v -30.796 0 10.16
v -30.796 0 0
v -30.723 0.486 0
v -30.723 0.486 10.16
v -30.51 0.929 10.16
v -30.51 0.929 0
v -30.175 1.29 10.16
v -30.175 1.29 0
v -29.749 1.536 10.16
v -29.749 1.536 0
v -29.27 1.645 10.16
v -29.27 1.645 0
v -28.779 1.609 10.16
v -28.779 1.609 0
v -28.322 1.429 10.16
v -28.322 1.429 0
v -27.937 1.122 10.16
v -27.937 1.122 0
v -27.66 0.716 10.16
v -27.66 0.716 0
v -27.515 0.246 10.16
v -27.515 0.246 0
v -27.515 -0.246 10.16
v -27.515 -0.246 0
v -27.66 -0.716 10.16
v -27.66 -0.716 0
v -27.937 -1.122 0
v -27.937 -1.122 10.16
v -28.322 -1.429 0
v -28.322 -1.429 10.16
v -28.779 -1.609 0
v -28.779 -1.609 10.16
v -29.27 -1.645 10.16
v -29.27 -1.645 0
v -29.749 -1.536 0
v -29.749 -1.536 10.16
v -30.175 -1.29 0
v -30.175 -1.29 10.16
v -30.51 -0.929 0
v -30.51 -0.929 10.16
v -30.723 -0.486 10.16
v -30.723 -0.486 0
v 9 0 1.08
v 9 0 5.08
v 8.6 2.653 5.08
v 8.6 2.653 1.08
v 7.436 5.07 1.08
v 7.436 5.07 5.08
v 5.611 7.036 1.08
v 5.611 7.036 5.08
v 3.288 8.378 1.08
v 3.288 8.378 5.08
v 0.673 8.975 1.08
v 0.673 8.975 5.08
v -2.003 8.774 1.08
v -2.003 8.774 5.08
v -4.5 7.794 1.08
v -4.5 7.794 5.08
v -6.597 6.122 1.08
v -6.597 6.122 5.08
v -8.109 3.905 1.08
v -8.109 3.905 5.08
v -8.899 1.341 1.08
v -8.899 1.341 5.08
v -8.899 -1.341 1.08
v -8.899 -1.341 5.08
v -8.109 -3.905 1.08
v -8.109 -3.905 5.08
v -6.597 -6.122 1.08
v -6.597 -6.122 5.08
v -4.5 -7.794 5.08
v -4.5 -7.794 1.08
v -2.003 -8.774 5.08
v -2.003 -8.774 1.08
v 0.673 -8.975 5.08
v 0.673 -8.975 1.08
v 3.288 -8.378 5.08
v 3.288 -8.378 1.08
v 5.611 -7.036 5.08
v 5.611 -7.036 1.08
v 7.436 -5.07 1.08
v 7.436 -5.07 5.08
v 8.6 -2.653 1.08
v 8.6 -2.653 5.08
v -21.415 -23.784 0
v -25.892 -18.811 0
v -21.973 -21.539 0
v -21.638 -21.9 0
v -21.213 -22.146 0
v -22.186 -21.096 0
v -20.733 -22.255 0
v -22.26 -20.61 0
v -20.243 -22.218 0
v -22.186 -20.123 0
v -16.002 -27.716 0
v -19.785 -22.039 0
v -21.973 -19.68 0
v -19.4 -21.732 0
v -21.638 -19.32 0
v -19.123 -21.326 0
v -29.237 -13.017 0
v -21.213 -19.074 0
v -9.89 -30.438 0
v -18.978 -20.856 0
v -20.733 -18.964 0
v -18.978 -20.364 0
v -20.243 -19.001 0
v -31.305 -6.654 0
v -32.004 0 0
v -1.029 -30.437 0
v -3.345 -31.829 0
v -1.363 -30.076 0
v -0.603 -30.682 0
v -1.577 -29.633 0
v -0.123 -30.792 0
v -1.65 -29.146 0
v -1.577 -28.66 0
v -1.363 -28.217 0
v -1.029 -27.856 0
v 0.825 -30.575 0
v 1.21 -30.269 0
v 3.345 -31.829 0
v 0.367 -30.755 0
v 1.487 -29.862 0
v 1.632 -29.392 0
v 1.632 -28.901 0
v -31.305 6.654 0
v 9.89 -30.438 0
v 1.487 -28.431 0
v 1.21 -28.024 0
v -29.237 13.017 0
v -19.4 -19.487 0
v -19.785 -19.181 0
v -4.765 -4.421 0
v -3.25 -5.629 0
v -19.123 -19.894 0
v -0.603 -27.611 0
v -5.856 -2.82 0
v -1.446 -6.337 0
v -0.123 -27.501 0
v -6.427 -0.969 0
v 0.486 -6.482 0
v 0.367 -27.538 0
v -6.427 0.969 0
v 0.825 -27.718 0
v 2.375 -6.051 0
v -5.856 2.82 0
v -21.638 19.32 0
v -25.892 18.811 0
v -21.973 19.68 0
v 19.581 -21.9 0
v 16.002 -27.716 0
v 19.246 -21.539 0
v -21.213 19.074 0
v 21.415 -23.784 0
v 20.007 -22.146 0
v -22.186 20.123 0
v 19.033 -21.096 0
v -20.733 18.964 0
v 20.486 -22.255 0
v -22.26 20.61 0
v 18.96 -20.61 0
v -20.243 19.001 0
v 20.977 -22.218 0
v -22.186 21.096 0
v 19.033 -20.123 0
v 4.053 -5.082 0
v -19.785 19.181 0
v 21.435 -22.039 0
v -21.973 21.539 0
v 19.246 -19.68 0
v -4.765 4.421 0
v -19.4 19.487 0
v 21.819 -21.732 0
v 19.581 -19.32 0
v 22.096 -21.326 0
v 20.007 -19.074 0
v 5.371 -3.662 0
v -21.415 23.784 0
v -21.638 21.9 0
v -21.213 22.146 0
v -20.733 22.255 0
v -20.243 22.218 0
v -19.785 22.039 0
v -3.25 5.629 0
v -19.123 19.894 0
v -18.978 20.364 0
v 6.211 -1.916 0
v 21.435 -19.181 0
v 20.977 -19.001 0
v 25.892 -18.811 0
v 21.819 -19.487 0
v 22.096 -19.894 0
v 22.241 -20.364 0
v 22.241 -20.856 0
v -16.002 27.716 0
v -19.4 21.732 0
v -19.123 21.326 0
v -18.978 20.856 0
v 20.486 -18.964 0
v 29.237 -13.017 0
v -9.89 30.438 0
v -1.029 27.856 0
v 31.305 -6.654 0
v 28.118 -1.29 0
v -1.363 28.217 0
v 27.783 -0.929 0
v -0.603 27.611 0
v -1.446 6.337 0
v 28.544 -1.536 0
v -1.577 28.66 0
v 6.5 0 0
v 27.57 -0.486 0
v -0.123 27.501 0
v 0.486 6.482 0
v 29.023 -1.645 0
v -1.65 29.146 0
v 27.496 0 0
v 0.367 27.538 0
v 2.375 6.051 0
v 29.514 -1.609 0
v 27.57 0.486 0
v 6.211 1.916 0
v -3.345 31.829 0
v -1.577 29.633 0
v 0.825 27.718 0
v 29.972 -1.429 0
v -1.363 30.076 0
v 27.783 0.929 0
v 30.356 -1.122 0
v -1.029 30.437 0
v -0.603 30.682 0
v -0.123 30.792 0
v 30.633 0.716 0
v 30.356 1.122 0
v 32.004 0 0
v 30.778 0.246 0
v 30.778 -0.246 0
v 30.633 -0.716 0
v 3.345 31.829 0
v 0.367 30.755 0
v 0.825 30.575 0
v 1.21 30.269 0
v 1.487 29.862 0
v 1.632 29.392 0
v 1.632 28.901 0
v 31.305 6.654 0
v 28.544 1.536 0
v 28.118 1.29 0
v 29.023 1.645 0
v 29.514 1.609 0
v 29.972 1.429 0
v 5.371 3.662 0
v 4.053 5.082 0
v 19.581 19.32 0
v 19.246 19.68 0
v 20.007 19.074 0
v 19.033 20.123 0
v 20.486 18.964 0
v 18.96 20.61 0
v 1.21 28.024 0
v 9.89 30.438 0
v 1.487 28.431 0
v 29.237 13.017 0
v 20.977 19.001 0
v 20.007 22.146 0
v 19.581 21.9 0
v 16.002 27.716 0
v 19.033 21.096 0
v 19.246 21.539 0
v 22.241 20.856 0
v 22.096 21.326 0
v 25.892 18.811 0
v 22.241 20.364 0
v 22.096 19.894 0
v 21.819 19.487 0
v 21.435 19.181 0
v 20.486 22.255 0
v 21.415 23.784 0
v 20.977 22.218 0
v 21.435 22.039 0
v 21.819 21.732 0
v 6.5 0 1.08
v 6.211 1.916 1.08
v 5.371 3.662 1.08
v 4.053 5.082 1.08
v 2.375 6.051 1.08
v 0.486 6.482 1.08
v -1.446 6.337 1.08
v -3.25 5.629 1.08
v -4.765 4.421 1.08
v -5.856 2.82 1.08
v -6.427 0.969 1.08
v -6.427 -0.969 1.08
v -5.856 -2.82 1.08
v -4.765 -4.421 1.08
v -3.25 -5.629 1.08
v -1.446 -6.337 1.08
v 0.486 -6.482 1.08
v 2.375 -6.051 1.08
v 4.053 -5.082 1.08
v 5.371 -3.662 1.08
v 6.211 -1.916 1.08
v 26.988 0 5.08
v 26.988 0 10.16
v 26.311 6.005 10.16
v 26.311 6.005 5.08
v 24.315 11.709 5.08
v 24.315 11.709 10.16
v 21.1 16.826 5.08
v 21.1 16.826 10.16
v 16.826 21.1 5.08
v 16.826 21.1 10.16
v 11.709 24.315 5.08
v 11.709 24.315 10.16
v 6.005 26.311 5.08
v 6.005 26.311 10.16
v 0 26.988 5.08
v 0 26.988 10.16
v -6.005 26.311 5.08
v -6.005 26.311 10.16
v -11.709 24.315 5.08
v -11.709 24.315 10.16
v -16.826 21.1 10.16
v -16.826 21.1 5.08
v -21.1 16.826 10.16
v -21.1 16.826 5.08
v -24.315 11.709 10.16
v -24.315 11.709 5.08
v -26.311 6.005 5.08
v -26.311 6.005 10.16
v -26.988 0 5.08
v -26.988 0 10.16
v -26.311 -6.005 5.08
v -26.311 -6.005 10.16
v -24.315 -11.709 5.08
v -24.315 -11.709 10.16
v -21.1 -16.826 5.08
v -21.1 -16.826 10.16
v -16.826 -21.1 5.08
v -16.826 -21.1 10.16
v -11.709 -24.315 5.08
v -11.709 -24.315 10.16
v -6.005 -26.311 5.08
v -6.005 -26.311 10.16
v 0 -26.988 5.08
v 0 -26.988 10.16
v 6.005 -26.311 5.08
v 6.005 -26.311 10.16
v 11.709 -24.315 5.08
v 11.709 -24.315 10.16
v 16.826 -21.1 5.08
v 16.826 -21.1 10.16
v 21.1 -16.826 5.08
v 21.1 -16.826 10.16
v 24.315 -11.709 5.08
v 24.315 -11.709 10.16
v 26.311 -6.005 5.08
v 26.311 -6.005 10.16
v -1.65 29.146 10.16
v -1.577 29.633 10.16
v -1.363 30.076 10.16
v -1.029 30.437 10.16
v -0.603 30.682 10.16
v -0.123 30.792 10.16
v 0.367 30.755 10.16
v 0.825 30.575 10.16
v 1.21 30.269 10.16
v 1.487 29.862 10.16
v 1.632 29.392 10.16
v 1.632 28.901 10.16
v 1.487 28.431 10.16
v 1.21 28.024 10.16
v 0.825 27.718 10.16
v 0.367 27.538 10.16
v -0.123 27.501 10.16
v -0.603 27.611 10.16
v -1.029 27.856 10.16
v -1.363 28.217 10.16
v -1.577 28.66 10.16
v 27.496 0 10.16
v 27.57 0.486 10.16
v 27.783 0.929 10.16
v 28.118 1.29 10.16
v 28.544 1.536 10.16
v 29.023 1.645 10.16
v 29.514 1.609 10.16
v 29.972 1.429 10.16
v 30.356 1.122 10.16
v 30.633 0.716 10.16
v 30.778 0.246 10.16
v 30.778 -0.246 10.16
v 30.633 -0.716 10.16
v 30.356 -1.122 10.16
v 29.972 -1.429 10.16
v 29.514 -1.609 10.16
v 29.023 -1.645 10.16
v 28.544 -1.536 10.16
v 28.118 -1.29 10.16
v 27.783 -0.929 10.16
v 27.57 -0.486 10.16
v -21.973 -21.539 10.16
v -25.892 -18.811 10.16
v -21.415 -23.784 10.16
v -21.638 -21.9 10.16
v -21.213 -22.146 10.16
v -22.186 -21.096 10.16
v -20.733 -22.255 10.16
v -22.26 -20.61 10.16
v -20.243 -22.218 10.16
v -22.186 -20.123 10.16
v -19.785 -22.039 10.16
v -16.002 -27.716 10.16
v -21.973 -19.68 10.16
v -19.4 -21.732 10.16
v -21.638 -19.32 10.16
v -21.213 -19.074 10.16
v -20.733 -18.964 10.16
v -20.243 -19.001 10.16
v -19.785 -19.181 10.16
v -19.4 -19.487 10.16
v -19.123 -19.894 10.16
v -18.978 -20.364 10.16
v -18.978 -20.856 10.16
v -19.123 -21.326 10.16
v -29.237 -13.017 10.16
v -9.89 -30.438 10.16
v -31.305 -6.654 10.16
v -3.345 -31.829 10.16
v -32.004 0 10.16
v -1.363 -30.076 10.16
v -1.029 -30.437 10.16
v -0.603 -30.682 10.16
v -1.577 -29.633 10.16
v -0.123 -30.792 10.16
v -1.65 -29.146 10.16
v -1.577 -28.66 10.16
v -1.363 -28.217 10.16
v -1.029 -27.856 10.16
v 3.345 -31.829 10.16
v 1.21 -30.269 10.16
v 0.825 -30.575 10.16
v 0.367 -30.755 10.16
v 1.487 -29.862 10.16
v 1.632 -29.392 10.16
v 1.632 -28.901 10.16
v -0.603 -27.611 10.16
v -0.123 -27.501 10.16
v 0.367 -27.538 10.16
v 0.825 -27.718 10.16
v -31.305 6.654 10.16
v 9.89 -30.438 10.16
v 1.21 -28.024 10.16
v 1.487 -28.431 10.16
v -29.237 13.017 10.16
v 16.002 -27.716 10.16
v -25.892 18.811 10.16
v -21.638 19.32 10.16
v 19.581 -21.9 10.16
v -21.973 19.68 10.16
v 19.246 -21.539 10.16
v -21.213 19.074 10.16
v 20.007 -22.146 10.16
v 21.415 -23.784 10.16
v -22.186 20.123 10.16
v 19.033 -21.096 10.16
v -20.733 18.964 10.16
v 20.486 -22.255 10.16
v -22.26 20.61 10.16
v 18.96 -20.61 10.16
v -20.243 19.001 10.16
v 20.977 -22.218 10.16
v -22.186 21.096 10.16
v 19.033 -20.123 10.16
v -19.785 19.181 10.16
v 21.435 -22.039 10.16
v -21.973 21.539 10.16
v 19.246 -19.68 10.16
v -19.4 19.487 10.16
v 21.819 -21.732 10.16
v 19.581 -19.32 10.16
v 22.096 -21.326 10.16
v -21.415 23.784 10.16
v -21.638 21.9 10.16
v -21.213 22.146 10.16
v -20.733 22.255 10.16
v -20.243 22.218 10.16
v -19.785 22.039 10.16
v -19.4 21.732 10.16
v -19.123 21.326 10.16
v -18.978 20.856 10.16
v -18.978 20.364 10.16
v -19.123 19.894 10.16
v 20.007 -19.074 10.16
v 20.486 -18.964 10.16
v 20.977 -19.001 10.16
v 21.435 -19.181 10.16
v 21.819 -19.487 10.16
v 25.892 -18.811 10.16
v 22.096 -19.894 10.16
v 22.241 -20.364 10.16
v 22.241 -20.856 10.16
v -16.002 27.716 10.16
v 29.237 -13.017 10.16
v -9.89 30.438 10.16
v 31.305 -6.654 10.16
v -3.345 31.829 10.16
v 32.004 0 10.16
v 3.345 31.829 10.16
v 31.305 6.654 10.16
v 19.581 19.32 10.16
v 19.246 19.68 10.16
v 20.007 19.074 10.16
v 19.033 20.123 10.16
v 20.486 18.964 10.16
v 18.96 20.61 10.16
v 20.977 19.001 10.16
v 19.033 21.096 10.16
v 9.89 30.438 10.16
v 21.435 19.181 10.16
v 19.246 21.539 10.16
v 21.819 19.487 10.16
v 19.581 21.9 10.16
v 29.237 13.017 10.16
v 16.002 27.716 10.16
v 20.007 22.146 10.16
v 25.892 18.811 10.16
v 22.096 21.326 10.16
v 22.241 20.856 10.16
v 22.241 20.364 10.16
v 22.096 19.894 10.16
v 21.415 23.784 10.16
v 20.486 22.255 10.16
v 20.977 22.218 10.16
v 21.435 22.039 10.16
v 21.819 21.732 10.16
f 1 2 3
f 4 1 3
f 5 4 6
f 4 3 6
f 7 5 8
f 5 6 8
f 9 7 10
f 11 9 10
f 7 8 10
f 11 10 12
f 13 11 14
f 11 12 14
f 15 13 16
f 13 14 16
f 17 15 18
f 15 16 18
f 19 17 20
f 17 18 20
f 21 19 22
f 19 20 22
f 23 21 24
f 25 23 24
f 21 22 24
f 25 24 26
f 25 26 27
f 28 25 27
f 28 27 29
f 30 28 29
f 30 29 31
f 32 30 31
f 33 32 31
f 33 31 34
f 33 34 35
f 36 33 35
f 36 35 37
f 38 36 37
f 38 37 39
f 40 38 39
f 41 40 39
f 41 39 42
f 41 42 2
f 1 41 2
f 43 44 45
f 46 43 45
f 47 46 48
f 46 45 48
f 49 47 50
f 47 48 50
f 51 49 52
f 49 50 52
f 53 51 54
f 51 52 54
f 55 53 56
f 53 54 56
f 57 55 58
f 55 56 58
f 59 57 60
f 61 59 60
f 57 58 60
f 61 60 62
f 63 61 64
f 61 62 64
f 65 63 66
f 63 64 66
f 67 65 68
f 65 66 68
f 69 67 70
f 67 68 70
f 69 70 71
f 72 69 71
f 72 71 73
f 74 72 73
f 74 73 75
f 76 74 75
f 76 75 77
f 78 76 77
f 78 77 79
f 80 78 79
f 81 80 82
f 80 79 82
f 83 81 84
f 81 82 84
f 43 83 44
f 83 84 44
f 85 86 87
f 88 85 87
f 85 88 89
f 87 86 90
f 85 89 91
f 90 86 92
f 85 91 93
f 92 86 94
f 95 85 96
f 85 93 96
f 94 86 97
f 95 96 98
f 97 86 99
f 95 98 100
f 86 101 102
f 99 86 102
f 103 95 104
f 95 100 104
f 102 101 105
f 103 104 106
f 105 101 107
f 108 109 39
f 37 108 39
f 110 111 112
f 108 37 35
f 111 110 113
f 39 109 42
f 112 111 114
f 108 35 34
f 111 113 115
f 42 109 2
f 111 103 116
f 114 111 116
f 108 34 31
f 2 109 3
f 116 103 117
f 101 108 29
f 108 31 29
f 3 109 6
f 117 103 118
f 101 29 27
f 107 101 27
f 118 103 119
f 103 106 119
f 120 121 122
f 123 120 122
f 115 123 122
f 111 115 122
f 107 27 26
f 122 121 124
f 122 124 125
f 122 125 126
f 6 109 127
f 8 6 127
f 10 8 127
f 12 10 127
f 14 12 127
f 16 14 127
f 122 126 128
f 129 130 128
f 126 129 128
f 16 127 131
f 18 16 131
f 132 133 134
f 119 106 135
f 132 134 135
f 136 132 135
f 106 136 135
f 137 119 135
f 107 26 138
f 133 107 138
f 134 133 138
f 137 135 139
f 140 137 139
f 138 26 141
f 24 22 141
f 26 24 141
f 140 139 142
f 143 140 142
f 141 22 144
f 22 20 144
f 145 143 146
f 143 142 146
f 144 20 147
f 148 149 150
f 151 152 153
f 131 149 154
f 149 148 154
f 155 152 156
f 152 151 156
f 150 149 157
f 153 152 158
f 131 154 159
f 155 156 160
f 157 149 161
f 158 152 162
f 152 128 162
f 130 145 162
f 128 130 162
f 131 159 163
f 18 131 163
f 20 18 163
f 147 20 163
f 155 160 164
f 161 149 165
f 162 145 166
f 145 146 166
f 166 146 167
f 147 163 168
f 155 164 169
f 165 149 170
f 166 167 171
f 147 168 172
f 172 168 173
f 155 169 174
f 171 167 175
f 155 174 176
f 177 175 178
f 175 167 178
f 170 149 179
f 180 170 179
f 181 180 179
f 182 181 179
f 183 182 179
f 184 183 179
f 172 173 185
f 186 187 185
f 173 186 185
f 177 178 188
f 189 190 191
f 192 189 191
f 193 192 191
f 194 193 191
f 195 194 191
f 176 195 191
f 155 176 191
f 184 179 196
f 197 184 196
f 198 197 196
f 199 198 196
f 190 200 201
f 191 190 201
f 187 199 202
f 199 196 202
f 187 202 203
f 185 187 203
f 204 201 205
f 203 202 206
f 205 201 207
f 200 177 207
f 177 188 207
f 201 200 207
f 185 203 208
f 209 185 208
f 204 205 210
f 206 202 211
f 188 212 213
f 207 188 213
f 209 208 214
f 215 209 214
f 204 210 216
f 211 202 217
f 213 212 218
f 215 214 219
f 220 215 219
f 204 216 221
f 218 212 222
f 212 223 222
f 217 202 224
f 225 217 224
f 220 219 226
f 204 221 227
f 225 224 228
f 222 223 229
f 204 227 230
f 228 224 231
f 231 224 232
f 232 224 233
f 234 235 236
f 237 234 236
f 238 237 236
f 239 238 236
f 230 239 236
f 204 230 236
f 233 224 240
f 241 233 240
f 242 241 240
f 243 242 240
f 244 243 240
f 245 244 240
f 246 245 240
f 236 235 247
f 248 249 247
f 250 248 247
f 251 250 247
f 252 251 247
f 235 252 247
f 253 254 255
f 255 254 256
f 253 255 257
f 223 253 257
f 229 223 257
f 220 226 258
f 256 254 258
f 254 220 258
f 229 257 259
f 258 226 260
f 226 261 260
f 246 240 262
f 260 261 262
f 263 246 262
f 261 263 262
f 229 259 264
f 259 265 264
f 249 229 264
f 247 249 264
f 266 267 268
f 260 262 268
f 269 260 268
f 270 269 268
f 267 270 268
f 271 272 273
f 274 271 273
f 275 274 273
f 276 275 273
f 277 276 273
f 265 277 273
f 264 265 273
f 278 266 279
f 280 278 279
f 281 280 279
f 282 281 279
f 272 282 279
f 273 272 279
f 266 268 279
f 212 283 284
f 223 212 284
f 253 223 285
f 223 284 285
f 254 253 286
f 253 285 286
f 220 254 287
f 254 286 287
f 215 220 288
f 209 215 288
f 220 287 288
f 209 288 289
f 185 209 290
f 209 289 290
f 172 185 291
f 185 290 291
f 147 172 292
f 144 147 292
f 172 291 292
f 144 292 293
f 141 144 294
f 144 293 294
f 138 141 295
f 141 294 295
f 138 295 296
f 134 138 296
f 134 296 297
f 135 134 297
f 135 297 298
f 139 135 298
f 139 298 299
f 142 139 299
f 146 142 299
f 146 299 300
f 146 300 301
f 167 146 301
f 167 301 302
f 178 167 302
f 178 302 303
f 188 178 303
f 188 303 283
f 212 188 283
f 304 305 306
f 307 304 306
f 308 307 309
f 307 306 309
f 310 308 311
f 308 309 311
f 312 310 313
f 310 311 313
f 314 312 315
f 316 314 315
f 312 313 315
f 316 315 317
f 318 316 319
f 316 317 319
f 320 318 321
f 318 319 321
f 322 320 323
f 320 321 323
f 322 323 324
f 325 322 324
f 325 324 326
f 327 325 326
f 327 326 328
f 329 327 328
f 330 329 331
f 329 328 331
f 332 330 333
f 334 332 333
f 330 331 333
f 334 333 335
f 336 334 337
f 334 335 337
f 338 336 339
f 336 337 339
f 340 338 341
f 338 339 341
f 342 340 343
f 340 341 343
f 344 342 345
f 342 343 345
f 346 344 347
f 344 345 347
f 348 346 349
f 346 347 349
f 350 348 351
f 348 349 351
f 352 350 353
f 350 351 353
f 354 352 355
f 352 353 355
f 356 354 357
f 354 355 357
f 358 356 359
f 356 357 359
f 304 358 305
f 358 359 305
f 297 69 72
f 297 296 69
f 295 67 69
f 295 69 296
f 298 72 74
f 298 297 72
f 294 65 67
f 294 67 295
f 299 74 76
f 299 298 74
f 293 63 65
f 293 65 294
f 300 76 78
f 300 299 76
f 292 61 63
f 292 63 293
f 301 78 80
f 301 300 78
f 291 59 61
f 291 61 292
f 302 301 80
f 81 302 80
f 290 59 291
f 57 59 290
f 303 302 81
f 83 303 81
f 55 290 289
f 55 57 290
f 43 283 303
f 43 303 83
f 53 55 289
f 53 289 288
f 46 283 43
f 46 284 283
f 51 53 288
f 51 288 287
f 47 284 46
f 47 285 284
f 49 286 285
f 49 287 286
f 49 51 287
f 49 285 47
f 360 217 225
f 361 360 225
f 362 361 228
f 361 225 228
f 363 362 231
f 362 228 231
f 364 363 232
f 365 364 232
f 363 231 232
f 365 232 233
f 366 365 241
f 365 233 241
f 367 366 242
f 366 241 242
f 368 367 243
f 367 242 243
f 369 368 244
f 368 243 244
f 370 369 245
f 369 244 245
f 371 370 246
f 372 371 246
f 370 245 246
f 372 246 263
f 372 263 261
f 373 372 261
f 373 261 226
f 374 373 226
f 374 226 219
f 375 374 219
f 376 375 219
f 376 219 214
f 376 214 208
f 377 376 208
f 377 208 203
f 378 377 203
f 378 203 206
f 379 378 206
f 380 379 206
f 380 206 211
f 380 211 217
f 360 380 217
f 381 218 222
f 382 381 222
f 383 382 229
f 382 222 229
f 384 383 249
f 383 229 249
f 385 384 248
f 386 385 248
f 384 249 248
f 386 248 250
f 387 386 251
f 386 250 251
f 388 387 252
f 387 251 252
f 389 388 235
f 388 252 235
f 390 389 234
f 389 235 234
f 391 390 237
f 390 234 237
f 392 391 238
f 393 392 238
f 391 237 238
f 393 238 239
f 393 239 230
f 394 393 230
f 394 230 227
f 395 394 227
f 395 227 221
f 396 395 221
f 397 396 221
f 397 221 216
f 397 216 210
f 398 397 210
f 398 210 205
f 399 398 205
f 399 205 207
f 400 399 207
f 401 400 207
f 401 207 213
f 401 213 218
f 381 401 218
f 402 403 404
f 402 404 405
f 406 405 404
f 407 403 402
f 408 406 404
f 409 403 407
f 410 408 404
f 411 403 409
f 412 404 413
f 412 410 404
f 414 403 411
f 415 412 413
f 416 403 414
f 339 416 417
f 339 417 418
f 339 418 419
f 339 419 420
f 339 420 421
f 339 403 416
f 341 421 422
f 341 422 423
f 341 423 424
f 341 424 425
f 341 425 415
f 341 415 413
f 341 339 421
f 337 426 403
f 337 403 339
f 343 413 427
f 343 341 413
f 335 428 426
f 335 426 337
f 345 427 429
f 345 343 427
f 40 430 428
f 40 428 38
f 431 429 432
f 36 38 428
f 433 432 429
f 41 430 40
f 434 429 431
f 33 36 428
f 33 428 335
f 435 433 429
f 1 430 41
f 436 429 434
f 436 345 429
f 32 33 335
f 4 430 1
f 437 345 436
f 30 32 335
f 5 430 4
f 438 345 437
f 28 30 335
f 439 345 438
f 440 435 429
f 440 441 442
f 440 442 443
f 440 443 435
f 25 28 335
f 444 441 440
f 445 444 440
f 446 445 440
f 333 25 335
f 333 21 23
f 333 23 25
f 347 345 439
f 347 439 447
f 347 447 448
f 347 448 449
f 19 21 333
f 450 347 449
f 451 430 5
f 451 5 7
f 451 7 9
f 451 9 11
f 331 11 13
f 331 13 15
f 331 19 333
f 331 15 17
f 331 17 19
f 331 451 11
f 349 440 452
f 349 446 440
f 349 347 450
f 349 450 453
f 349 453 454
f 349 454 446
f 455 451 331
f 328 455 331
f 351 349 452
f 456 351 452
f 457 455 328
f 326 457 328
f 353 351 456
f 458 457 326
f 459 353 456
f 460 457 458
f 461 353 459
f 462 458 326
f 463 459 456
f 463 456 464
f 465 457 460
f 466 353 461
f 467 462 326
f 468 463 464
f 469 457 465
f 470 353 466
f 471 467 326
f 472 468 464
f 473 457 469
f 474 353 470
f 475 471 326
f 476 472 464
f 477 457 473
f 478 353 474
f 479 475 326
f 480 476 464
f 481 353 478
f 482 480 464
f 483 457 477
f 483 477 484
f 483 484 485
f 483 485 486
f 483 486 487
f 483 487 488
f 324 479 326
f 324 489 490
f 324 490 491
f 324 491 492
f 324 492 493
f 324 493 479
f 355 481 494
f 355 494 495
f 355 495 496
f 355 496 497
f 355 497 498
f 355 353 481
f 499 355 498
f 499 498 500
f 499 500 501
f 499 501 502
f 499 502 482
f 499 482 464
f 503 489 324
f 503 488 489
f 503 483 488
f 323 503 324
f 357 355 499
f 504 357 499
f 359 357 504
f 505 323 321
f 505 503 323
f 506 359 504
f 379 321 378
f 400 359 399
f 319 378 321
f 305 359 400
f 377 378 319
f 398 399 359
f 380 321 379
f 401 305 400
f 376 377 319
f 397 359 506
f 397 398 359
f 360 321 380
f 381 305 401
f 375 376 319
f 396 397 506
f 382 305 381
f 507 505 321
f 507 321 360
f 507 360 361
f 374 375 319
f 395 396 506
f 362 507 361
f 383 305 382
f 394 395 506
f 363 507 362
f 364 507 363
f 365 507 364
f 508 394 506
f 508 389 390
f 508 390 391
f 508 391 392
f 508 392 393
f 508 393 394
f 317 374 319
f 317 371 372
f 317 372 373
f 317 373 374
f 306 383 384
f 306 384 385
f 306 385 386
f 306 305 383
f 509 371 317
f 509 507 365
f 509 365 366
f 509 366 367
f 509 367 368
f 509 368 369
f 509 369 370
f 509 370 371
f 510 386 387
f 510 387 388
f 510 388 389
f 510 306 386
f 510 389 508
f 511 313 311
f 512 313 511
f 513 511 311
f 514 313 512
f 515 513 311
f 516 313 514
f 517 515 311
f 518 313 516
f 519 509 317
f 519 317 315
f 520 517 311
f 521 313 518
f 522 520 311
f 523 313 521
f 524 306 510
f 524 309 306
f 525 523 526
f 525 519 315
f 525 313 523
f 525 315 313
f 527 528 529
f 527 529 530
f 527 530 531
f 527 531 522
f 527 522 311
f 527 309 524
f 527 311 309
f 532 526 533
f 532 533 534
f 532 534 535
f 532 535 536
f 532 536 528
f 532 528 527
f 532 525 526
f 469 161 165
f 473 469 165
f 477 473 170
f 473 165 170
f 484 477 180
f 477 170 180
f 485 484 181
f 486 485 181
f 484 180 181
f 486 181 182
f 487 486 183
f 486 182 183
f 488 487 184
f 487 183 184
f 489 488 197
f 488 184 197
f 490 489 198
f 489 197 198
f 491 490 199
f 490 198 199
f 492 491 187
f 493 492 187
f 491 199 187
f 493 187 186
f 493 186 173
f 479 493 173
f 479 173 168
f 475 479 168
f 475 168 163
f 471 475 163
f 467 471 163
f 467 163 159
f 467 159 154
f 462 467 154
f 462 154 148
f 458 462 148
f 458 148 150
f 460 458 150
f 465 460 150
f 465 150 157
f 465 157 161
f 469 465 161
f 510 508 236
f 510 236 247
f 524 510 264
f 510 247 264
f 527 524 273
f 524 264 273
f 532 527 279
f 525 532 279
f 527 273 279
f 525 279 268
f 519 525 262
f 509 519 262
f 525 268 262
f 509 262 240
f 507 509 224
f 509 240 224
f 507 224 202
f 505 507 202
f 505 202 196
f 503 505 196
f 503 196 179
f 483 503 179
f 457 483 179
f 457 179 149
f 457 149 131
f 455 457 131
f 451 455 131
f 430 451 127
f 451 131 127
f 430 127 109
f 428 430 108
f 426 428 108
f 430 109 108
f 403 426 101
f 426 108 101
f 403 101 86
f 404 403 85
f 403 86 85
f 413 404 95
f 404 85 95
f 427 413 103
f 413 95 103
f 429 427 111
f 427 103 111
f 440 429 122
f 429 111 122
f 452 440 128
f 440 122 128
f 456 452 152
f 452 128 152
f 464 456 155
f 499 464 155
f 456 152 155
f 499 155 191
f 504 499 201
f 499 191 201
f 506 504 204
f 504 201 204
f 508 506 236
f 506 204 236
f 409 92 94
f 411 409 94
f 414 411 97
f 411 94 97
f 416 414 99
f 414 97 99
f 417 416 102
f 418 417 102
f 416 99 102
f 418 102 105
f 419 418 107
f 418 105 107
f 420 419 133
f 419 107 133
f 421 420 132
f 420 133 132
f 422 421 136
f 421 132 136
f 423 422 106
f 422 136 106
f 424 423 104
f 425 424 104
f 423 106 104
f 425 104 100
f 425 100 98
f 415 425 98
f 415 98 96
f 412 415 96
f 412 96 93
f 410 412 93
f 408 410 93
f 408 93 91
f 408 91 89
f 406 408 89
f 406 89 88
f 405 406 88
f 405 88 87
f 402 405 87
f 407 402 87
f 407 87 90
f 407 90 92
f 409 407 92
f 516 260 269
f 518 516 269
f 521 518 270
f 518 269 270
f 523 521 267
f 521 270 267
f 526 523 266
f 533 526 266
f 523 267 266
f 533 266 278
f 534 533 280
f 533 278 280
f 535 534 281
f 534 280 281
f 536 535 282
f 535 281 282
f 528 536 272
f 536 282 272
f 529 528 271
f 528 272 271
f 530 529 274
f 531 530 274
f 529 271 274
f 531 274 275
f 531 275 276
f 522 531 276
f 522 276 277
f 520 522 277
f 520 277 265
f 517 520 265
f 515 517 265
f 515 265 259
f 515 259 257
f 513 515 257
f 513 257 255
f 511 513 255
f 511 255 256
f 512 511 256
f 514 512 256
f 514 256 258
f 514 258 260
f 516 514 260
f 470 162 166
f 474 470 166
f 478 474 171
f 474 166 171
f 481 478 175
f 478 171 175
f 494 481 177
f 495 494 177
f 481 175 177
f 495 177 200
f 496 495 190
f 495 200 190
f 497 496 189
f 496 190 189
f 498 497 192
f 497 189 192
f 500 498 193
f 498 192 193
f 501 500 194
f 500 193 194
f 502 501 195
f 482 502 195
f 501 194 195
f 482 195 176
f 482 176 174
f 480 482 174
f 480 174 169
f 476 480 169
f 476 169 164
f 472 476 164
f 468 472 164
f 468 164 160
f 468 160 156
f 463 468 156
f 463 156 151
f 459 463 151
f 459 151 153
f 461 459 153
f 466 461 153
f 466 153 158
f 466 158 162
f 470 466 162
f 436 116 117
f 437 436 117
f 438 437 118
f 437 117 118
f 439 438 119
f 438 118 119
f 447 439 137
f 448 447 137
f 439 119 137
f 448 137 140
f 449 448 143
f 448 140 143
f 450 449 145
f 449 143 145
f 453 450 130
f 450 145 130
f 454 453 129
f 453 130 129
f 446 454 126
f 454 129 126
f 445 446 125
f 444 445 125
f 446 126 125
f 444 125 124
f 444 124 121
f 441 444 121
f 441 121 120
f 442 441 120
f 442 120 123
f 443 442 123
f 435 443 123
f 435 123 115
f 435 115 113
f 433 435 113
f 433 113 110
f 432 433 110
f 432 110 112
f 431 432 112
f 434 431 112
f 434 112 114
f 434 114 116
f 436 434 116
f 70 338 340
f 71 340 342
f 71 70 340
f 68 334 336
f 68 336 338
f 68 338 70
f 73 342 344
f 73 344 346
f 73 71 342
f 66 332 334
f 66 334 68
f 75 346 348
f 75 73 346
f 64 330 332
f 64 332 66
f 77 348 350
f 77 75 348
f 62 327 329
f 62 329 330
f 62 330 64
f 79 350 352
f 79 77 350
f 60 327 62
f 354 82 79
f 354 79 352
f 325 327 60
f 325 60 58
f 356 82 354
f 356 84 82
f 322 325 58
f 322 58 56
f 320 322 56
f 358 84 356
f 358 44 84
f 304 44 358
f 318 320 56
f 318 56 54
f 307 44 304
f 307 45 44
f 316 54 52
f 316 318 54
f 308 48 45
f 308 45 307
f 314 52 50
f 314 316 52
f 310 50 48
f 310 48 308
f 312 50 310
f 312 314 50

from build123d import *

# Parameters (mm, degrees)
SKETCH1_R             = 32.004
BOSS_EXTRUDE1_DEPTH   = 10.16
SKETCH2_R             = 26.9875
CUT_EXTRUDE1_DEPTH    = 5.08
SKETCH3_R             = 9
CUT_EXTRUDE2_DEPTH    = 4
SKETCH4_R             = 6.5
CUT_EXTRUDE3_DEPTH    = 47.162305315
M4X0_7_TAPPED_HOLE1_D = 3.3


with BuildPart() as part:
    # Sketch1 → Boss-Extrude1 (new body)
    with BuildSketch(Plane.XY):
        Circle(SKETCH1_R)
    extrude(amount=BOSS_EXTRUDE1_DEPTH)

    # Sketch2 → Cut-Extrude1 (cut)
    with BuildSketch(Plane.XY.offset(10.16)):
        Circle(SKETCH2_R)
    extrude(amount=-CUT_EXTRUDE1_DEPTH, mode=Mode.SUBTRACT)

    # Sketch3 → Cut-Extrude2 (cut)
    with BuildSketch(Plane.XY.offset(5.08)):
        Circle(SKETCH3_R)
    extrude(amount=-CUT_EXTRUDE2_DEPTH, mode=Mode.SUBTRACT)

    # Sketch4 → Cut-Extrude3 (cut, through all)
    with BuildSketch(Plane.XY.offset(1.08)):
        Circle(SKETCH4_R)
    extrude(amount=-CUT_EXTRUDE3_DEPTH, mode=Mode.SUBTRACT)

    # M4x0.7 Tapped Hole1 (through all)
    with Locations(Plane.XY.offset(10.16)):
        with Locations((-20.609687798, 20.609687798), (0, 29.1465), (20.609687798, 20.609687798), (29.1465, 0), (20.609687798, -20.609687798), (0, -29.1465), (-20.609687798, -20.609687798), (-29.1465, 0)):
            Hole(M4X0_7_TAPPED_HOLE1_D / 2)


solid = part.part
